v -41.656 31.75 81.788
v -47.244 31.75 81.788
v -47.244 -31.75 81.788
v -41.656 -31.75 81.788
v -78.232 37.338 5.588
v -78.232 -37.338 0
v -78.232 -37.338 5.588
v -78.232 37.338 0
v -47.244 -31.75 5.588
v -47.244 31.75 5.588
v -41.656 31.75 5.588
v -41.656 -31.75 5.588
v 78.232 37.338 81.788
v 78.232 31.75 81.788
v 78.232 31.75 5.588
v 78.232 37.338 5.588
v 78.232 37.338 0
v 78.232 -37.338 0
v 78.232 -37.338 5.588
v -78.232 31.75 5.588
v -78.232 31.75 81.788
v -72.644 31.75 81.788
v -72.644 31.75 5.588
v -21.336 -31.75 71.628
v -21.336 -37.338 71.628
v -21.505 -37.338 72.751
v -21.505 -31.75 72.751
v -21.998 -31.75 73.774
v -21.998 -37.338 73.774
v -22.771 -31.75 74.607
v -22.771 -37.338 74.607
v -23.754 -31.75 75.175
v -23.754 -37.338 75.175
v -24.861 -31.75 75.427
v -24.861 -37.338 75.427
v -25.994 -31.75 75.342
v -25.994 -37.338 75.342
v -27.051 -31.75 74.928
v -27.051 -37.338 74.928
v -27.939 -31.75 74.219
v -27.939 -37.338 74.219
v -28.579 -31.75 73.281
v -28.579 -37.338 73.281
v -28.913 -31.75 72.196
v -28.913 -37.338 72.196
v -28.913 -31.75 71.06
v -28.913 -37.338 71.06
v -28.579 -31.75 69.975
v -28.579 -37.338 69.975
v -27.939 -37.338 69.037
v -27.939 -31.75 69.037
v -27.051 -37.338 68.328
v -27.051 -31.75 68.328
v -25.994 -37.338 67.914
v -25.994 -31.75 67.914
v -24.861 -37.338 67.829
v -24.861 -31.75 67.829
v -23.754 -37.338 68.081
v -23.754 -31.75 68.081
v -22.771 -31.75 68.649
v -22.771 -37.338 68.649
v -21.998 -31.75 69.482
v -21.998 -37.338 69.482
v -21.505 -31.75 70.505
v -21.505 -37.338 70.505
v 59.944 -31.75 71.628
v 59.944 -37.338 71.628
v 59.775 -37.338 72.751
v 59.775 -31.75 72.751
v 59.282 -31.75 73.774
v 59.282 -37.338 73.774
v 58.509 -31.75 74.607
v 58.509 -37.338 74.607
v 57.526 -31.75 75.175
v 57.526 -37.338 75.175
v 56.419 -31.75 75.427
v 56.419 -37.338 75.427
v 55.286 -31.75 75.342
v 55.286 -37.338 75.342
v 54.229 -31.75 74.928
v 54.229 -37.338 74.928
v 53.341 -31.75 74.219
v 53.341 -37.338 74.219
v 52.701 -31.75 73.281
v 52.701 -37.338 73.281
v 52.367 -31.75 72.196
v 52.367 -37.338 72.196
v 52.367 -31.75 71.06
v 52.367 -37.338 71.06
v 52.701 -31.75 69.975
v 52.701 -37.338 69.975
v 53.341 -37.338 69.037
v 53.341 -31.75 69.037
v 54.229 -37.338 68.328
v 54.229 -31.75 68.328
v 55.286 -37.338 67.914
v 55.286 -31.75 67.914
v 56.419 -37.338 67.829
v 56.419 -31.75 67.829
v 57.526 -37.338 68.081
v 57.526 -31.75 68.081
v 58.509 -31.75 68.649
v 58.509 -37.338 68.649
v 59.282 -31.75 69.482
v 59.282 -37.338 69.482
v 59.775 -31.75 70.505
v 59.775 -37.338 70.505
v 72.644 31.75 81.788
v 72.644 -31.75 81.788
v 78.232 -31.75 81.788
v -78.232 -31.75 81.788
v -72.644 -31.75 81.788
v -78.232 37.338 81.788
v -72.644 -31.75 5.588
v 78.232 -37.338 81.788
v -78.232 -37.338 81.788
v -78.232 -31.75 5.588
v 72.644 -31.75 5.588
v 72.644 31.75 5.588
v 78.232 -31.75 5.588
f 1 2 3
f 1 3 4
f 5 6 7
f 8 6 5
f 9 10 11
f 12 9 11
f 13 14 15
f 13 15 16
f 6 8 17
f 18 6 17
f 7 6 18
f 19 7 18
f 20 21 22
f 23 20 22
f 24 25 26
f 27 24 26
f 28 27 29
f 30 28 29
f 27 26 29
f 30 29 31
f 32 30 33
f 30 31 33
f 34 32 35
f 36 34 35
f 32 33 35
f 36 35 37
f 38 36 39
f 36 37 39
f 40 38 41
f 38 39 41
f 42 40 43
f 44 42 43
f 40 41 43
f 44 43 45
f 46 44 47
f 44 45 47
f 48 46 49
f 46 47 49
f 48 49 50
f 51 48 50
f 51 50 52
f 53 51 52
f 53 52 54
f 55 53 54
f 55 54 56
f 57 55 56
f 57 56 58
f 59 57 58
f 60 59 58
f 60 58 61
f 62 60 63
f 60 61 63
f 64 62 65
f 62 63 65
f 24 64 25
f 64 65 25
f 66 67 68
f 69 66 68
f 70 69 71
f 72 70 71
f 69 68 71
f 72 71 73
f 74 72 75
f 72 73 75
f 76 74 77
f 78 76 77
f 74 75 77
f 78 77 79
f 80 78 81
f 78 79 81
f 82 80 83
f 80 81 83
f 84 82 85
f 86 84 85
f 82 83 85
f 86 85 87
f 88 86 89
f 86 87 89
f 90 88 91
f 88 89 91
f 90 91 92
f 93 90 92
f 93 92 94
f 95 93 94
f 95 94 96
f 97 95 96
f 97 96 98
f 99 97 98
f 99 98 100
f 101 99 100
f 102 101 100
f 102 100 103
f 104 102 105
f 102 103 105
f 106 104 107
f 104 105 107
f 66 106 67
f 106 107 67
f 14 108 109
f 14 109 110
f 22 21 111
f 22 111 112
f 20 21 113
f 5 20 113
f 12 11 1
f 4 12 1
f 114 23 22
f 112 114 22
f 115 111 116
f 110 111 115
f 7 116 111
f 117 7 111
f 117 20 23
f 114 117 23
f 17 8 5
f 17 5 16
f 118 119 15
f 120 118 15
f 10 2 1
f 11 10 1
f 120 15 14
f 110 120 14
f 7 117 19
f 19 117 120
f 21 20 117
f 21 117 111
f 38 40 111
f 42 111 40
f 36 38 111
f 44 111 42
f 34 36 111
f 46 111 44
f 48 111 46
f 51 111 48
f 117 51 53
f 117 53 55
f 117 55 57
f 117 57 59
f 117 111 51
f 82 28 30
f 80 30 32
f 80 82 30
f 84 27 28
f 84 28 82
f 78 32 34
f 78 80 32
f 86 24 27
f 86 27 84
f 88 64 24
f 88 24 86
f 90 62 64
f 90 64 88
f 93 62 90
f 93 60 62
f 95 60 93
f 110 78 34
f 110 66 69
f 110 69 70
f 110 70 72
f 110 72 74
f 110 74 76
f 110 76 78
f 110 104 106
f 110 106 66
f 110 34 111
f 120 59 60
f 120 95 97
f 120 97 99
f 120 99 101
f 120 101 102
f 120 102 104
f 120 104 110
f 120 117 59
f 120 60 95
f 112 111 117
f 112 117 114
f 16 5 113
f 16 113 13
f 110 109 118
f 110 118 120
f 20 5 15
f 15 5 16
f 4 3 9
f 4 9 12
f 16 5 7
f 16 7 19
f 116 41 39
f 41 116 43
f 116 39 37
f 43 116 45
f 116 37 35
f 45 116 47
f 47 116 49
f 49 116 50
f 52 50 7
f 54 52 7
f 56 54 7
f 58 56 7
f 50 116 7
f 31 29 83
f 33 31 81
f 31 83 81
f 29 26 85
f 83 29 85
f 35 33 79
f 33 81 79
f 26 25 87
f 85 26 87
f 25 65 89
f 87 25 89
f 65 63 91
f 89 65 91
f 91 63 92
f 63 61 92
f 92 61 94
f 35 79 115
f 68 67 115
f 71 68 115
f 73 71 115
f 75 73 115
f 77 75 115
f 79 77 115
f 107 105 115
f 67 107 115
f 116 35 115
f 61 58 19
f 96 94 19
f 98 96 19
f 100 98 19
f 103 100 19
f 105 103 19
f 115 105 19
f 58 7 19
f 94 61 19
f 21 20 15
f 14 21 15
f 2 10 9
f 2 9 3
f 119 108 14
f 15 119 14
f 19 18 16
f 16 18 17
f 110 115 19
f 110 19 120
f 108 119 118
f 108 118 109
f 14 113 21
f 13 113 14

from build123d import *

# Parameters (mm, degrees)
F0_W      = 156.464
F0_H      = 74.676
F1_DEPTH  = 5.588
F2_W      = 156.464
F2_H      = 5.588
F3_DEPTH  = 76.2
F4_W      = 156.464
F4_H      = 5.588
F5_DEPTH  = 76.2
F6_W      = 5.588
F6_H      = 76.2
F7_DEPTH  = 63.5
F8_W      = 5.588
F8_H      = 76.2
F9_DEPTH  = 63.5
F10_W     = 5.588
F10_H     = 76.2
F11_DEPTH = 63.5
F12_R     = 3.81
F13_DEPTH = 5.588


with BuildPart() as f1:
    # F0 (on Top) → F1 (new body)
    with BuildSketch(Plane.XY):
        Rectangle(F0_W, F0_H)
    extrude(amount=F1_DEPTH)


with BuildPart() as f3:
    # F2 (on face) → F3 (new body)
    with BuildSketch(Plane.XY.offset(5.588)):
        with Locations((0, 34.544)):
            Rectangle(F2_W, F2_H)
    extrude(amount=F3_DEPTH)


with BuildPart() as f5:
    # F4 (on face) → F5 (new body)
    with BuildSketch(Plane.XY.offset(5.588)):
        with Locations((0, -34.544)):
            Rectangle(F4_W, F4_H)
    extrude(amount=F5_DEPTH)

    # F12 (on face) → F13 (cut, through all)
    with BuildSketch(Plane.XZ.offset(37.338)):
        with Locations((-25.146, 71.628)):
            Circle(F12_R)
        with Locations((56.134, 71.628)):
            Circle(F12_R)
    extrude(amount=-F13_DEPTH, mode=Mode.SUBTRACT)


with BuildPart() as f7:
    # F6 (on face) → F7 (new body, through all)
    with BuildSketch(Plane.XZ.offset(-31.75)):
        with Locations((-75.438, 43.688)):
            Rectangle(F6_W, F6_H)
    extrude(amount=F7_DEPTH)


with BuildPart() as f9:
    # F8 (on face) → F9 (new body, through all)
    with BuildSketch(Plane.XZ.offset(-31.75)):
        with Locations((75.438, 43.688)):
            Rectangle(F8_W, F8_H)
    extrude(amount=F9_DEPTH)


with BuildPart() as f11:
    # F10 (on face) → F11 (new body, through all)
    with BuildSketch(Plane.XZ.offset(-31.75)):
        with Locations((-44.45, 43.688)):
            Rectangle(F10_W, F10_H)
    extrude(amount=F11_DEPTH)


solid = Compound([f1.part, f3.part, f5.part, f7.part, f9.part, f11.part])
